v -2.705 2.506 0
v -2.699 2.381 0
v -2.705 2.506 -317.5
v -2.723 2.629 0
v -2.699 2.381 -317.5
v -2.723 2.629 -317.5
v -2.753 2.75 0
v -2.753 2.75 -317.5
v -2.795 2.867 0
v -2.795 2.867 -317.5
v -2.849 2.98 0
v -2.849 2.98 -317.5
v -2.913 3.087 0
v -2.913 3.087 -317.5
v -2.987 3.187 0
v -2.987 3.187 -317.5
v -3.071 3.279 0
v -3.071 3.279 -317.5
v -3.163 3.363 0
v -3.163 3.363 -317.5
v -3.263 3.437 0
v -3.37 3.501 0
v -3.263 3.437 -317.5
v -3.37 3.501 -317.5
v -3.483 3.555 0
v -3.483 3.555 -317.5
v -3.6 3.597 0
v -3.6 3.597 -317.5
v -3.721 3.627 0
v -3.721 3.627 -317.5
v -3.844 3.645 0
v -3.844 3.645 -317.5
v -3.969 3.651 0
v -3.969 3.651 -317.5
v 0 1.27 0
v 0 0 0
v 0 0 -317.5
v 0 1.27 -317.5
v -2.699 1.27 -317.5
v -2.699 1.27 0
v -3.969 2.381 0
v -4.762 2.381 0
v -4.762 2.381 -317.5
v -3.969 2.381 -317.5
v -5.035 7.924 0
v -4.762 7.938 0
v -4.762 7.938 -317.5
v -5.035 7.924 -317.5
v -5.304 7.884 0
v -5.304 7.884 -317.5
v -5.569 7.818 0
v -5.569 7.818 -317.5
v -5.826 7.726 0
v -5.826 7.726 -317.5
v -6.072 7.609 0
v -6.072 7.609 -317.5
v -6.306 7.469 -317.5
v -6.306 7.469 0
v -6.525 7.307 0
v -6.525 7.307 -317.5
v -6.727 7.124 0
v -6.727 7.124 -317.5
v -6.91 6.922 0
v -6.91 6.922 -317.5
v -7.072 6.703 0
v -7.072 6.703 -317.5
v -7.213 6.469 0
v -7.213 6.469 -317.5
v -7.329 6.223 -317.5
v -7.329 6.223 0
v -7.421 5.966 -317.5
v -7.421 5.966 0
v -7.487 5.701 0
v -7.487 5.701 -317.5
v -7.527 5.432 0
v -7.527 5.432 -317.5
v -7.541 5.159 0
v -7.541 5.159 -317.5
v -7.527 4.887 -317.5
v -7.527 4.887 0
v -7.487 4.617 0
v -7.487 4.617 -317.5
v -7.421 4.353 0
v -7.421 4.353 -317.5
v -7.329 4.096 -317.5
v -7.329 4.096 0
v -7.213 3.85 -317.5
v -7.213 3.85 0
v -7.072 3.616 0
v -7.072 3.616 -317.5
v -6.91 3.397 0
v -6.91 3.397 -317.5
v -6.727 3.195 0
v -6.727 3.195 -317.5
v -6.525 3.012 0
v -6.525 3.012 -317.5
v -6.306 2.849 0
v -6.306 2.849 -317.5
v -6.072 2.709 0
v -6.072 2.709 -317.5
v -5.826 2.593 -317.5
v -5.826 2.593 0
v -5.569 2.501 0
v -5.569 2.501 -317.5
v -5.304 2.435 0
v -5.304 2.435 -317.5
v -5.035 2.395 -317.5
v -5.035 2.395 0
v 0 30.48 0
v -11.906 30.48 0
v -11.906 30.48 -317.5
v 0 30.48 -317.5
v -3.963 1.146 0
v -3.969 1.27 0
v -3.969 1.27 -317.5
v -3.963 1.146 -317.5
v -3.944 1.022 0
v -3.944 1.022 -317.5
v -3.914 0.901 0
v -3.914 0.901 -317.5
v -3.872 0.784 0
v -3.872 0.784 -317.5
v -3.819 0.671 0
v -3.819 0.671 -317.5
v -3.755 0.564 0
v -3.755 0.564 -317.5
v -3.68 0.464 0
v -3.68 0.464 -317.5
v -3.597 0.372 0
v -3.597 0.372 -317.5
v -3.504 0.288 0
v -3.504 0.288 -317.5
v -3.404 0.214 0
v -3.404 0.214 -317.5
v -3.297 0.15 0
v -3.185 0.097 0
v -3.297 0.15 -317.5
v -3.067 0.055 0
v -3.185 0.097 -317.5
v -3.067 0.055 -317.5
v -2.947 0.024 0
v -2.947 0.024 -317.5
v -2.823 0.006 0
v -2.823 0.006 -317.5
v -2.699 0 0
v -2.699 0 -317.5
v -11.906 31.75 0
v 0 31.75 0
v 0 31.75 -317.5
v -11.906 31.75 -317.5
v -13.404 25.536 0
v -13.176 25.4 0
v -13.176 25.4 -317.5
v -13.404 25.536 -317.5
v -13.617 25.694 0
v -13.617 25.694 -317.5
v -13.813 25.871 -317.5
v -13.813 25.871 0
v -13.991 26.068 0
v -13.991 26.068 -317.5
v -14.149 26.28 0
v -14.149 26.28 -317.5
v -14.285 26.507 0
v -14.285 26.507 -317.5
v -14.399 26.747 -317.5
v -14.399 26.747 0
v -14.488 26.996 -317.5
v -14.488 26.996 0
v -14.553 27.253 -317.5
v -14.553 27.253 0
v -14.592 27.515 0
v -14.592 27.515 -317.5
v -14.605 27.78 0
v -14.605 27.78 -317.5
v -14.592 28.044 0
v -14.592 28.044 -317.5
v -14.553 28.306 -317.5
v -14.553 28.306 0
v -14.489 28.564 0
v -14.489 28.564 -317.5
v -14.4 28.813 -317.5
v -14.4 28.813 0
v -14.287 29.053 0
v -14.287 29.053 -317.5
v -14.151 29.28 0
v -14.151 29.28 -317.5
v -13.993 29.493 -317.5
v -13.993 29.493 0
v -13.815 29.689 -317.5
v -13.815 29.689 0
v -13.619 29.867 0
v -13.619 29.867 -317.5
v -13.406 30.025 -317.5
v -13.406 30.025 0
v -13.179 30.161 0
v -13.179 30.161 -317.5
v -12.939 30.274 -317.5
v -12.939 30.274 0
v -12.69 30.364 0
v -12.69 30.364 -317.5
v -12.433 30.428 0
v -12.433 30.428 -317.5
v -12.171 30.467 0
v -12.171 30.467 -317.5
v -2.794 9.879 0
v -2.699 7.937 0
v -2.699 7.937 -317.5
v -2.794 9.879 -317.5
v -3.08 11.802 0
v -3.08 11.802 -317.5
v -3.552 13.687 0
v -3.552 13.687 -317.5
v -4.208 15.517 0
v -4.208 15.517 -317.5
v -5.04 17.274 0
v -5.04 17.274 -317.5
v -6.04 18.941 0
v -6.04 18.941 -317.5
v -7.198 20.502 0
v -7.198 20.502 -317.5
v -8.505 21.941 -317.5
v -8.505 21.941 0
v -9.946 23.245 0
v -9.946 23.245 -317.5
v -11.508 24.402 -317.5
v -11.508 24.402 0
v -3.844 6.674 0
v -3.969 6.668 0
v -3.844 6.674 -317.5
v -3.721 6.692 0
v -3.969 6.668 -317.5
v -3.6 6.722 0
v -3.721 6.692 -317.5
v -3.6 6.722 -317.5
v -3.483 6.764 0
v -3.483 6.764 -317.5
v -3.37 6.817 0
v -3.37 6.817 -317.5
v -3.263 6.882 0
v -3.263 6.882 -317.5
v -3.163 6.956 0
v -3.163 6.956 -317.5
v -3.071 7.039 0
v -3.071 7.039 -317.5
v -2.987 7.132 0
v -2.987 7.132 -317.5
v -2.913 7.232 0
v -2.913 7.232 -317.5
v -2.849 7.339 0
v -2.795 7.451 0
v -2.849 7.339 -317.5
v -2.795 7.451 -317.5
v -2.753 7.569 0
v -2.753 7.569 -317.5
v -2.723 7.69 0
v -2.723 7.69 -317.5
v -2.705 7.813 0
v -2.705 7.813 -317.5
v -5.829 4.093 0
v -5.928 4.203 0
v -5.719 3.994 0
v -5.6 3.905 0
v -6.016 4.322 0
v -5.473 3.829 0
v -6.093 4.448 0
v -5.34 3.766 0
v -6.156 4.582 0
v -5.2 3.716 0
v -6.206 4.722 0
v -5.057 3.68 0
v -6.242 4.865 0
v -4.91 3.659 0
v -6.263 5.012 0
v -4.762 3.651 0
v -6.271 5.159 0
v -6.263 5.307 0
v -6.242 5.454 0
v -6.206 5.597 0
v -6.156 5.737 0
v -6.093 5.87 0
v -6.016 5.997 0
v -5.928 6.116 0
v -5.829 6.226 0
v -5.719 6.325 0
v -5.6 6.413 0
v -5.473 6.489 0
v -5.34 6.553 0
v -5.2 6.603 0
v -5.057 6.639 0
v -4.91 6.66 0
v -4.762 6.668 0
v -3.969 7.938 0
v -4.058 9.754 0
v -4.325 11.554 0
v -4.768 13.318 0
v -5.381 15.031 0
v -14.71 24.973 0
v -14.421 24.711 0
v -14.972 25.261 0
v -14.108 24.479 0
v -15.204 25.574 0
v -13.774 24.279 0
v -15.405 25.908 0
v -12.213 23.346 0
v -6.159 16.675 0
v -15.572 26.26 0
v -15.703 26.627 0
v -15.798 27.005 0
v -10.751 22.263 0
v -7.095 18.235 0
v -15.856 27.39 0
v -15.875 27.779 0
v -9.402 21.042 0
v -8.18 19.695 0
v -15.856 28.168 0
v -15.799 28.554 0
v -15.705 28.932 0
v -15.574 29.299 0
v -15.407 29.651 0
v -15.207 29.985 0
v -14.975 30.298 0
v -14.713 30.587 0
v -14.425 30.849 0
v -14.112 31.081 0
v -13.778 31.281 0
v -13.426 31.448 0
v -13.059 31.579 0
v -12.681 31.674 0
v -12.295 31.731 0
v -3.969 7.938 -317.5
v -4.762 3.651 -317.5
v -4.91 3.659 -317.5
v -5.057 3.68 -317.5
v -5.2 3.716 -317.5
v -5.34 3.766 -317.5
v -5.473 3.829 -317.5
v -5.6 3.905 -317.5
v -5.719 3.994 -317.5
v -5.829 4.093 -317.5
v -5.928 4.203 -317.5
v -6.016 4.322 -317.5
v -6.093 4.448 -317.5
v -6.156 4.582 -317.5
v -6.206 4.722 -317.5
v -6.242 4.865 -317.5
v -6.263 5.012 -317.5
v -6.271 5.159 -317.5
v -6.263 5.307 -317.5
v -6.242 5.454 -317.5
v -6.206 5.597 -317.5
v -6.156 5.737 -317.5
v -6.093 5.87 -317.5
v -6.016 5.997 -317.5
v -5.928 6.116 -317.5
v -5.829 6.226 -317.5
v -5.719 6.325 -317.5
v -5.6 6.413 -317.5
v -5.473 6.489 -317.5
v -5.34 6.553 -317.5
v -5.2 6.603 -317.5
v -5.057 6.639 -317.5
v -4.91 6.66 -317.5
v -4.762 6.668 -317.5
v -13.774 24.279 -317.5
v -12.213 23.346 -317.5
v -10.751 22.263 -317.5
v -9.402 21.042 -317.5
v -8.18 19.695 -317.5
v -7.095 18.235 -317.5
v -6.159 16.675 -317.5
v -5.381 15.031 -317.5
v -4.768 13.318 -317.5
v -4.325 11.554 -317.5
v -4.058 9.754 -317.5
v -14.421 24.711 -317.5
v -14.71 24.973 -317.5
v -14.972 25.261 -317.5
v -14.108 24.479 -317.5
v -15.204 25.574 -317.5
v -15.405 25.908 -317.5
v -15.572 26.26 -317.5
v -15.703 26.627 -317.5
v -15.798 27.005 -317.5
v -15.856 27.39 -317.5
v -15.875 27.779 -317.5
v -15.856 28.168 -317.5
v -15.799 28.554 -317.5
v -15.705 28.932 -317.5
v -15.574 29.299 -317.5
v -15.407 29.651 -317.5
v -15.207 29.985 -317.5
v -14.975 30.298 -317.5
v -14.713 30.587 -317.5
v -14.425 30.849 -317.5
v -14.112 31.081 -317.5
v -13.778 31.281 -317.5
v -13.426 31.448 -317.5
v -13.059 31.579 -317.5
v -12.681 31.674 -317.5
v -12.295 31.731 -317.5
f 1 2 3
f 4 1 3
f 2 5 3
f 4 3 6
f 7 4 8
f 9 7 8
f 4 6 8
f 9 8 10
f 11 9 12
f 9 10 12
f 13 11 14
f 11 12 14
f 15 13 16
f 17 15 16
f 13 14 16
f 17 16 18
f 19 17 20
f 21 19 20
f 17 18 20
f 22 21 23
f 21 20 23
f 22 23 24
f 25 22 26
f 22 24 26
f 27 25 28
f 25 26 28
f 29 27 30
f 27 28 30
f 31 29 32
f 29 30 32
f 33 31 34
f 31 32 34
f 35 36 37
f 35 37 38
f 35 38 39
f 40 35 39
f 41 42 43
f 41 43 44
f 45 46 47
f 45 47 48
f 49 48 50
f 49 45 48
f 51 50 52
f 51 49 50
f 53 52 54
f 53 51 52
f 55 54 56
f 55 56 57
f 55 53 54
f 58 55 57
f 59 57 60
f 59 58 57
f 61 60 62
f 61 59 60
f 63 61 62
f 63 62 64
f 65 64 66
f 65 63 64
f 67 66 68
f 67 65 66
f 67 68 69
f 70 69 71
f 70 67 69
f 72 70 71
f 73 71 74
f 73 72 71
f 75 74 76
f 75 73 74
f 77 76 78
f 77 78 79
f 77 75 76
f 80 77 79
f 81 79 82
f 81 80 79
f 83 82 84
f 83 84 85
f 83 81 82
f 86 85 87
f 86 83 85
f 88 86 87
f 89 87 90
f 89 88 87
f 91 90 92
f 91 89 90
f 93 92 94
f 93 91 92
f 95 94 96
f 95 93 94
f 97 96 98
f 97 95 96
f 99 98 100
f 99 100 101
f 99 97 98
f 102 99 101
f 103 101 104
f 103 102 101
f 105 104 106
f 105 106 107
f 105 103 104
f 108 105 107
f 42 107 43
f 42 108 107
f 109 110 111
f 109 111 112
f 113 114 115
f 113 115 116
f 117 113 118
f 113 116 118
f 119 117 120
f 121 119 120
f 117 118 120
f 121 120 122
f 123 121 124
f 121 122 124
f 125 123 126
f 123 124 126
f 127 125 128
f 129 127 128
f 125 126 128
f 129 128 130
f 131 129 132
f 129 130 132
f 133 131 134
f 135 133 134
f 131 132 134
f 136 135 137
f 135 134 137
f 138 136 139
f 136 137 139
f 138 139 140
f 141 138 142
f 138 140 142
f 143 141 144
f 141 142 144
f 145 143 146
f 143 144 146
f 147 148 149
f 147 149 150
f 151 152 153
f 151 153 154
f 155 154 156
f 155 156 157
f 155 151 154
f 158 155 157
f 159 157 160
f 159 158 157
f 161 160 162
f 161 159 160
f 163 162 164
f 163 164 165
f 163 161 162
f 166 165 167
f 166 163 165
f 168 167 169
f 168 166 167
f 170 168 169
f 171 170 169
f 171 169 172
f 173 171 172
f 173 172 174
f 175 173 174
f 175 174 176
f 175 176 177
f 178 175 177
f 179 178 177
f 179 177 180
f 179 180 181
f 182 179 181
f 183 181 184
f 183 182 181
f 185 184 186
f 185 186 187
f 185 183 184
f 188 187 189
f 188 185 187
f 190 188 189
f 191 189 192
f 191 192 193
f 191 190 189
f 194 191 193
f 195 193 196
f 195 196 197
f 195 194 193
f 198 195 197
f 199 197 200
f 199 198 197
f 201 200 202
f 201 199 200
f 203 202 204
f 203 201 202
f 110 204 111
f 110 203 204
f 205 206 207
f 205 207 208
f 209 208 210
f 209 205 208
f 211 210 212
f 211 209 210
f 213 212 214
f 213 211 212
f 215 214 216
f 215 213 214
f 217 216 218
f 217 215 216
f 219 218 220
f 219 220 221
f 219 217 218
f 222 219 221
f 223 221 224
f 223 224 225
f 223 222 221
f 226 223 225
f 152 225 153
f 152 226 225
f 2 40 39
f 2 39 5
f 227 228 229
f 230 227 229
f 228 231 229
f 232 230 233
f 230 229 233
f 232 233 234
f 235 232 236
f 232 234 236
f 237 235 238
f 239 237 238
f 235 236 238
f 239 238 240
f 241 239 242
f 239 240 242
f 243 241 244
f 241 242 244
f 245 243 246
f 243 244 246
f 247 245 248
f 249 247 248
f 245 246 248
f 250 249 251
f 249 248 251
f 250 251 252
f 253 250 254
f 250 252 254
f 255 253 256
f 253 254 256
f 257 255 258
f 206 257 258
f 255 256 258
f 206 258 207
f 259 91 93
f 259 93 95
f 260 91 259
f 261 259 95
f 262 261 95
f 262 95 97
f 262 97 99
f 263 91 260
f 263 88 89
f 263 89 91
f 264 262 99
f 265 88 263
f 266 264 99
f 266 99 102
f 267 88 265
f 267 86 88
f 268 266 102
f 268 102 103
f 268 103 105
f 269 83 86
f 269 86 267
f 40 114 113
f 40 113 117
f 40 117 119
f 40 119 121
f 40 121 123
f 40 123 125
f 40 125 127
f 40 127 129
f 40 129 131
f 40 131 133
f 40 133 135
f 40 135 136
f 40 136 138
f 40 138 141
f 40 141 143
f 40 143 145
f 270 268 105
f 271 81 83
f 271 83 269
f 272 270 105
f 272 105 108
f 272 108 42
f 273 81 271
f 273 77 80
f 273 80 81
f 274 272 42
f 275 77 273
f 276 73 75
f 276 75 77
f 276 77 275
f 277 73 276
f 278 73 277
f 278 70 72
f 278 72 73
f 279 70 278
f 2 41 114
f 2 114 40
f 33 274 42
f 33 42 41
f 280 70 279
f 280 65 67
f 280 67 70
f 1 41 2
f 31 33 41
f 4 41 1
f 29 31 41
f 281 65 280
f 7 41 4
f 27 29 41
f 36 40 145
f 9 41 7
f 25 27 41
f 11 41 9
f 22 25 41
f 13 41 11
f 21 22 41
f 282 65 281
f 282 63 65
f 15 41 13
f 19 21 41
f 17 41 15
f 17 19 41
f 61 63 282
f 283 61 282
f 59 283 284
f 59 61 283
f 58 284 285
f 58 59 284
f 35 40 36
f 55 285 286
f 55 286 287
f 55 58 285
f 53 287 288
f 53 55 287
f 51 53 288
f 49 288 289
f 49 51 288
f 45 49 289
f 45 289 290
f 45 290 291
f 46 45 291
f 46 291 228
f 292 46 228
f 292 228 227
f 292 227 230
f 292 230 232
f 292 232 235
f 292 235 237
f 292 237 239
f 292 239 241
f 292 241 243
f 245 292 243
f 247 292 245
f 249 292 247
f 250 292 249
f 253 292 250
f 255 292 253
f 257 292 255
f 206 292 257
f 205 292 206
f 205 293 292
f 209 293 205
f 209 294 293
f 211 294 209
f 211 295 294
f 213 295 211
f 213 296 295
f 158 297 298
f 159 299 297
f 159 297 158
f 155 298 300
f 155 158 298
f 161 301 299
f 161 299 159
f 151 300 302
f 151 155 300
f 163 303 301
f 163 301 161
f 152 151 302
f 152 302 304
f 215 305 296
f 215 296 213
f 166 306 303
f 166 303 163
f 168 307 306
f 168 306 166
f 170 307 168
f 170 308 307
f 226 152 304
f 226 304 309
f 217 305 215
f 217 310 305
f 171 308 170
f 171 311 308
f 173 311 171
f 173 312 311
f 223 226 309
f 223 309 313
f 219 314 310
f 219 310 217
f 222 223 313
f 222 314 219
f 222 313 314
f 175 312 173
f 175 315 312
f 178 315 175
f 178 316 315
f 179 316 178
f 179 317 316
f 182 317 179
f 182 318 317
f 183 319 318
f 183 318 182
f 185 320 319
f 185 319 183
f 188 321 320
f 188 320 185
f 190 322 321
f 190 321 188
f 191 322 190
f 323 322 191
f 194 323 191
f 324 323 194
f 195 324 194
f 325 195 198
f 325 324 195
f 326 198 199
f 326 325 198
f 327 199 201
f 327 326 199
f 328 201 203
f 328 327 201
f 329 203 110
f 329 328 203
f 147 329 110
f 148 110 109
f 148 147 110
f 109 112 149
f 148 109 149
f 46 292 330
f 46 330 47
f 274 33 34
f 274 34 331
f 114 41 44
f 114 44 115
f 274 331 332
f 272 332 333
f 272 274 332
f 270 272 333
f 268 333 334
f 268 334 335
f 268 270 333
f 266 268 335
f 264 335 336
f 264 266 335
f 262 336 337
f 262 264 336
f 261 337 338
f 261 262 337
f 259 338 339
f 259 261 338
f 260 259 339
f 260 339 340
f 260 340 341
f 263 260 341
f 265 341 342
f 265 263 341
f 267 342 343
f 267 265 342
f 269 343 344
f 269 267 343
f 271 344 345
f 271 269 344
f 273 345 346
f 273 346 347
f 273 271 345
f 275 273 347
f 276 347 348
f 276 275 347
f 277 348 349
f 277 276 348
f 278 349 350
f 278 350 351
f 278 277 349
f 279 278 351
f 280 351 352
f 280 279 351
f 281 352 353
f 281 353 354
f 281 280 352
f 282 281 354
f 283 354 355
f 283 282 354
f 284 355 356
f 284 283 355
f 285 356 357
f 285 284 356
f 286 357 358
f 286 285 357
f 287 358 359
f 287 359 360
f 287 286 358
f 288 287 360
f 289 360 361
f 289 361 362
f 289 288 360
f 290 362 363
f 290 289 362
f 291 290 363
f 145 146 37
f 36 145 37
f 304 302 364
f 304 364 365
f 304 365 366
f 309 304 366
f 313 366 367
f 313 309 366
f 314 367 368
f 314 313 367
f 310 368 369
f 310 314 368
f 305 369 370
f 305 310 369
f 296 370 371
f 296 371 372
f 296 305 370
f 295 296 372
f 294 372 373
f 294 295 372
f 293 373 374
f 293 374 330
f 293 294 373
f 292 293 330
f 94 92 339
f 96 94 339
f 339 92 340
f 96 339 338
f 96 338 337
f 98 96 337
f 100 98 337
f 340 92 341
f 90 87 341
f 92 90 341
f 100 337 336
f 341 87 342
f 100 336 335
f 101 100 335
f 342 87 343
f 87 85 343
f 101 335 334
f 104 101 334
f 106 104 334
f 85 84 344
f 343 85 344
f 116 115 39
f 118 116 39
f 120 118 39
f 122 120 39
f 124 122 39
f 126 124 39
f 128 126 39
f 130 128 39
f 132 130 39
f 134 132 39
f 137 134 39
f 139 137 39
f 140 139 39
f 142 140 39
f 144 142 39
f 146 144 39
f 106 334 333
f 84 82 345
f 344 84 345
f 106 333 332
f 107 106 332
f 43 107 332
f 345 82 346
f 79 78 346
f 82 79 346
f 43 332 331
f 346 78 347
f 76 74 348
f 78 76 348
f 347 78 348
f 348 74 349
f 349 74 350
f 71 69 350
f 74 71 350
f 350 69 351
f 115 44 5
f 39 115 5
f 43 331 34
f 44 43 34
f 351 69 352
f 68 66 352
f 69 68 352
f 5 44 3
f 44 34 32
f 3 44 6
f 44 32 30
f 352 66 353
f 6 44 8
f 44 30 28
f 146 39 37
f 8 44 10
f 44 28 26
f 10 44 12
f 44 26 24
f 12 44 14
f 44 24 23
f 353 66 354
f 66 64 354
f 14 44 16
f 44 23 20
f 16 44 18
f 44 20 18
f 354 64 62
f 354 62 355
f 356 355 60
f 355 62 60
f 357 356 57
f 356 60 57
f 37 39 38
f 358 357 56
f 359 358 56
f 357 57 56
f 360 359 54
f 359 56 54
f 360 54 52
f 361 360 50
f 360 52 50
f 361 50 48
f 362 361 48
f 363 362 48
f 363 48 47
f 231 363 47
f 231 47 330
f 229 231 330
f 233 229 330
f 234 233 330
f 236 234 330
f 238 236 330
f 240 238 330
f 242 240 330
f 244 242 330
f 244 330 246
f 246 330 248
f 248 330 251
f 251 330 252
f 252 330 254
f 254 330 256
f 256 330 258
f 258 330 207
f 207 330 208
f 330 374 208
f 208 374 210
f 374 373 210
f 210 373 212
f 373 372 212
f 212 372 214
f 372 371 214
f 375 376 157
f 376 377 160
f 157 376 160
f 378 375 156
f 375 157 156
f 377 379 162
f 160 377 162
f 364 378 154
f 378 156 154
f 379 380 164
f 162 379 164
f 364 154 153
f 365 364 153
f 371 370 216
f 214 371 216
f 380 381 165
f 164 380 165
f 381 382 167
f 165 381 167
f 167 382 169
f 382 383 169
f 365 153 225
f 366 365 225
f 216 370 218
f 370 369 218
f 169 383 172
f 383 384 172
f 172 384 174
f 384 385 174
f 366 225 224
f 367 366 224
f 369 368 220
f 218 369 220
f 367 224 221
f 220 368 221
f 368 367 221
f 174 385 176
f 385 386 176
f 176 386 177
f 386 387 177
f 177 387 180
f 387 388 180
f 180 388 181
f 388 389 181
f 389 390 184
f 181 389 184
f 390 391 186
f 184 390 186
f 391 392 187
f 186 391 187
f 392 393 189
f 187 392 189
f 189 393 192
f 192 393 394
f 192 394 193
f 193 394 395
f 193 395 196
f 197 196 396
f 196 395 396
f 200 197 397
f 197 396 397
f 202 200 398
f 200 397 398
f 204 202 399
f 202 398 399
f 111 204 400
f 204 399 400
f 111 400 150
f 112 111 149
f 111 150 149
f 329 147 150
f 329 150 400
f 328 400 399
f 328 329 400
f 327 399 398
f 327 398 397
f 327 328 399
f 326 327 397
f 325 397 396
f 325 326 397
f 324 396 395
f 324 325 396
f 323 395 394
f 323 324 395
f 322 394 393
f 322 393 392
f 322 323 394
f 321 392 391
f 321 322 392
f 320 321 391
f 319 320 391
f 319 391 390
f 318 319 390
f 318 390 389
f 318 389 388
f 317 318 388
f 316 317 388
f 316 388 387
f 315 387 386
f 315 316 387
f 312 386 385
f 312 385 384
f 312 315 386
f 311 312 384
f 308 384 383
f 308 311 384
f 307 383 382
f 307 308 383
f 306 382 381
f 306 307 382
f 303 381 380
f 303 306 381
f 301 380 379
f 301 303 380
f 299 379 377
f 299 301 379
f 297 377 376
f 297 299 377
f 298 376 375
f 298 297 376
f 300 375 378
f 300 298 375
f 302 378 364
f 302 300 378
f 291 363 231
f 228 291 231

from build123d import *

# Parameters (mm, degrees)
EXTRUDE_THIN1_DEPTH = 317.5
FILLET1_R           = 1.27


with BuildPart() as part:
    # Sketch1 → Extrude-Thin1 (new body)
    with BuildSketch(Plane.XY):
        with BuildLine():
            Line((0, 31.75), (-11.90625, 31.75))
            ThreePointArc((-11.90625, 31.75), (-15.756503047, 28.743813262), (-13.773897059, 24.279411765))
            ThreePointArc((-13.773897059, 24.279411765), (-6.608099772, 17.466390137), (-3.96875, 7.9375))
            Line((-3.96875, 7.9375), (-4.7625, 7.9375))
            ThreePointArc((-4.7625, 7.9375), (-7.540625, 5.159375), (-4.7625, 2.38125))
            Line((-4.7625, 2.38125), (-3.96875, 2.38125))
            Line((-3.96875, 2.38125), (-3.96875, 0))
            Line((-3.96875, 0), (0, 0))
            Line((0, 0), (0, 1.27))
            Line((0, 1.27), (-2.69875, 1.27))
            Line((-2.69875, 1.27), (-2.69875, 3.65125))
            Line((-2.69875, 3.65125), (-4.7625, 3.65125))
            ThreePointArc((-4.7625, 3.65125), (-6.270625, 5.159375), (-4.7625, 6.6675))
            Line((-4.7625, 6.6675), (-2.7395407, 6.6675))
            ThreePointArc((-2.7395407, 6.6675), (-5.200957167, 17.569762939), (-13.17625, 25.4))
            ThreePointArc((-13.17625, 25.4), (-14.524422072, 28.435793018), (-11.90625, 30.48))
            Line((-11.90625, 30.48), (0, 30.48))
            Line((0, 30.48), (0, 31.75))
        make_face()
    extrude(amount=-EXTRUDE_THIN1_DEPTH)

    # Fillet1
    fillet1_edges = [part.edges().sort_by_distance(p)[0] for p in [
        (-3.96875, 0, -158.75),
        (-2.7395407, 6.6675, -158.75),
        (-2.69875, 3.65125, -158.75),
    ]]
    fillet(fillet1_edges, radius=FILLET1_R)


solid = part.part
